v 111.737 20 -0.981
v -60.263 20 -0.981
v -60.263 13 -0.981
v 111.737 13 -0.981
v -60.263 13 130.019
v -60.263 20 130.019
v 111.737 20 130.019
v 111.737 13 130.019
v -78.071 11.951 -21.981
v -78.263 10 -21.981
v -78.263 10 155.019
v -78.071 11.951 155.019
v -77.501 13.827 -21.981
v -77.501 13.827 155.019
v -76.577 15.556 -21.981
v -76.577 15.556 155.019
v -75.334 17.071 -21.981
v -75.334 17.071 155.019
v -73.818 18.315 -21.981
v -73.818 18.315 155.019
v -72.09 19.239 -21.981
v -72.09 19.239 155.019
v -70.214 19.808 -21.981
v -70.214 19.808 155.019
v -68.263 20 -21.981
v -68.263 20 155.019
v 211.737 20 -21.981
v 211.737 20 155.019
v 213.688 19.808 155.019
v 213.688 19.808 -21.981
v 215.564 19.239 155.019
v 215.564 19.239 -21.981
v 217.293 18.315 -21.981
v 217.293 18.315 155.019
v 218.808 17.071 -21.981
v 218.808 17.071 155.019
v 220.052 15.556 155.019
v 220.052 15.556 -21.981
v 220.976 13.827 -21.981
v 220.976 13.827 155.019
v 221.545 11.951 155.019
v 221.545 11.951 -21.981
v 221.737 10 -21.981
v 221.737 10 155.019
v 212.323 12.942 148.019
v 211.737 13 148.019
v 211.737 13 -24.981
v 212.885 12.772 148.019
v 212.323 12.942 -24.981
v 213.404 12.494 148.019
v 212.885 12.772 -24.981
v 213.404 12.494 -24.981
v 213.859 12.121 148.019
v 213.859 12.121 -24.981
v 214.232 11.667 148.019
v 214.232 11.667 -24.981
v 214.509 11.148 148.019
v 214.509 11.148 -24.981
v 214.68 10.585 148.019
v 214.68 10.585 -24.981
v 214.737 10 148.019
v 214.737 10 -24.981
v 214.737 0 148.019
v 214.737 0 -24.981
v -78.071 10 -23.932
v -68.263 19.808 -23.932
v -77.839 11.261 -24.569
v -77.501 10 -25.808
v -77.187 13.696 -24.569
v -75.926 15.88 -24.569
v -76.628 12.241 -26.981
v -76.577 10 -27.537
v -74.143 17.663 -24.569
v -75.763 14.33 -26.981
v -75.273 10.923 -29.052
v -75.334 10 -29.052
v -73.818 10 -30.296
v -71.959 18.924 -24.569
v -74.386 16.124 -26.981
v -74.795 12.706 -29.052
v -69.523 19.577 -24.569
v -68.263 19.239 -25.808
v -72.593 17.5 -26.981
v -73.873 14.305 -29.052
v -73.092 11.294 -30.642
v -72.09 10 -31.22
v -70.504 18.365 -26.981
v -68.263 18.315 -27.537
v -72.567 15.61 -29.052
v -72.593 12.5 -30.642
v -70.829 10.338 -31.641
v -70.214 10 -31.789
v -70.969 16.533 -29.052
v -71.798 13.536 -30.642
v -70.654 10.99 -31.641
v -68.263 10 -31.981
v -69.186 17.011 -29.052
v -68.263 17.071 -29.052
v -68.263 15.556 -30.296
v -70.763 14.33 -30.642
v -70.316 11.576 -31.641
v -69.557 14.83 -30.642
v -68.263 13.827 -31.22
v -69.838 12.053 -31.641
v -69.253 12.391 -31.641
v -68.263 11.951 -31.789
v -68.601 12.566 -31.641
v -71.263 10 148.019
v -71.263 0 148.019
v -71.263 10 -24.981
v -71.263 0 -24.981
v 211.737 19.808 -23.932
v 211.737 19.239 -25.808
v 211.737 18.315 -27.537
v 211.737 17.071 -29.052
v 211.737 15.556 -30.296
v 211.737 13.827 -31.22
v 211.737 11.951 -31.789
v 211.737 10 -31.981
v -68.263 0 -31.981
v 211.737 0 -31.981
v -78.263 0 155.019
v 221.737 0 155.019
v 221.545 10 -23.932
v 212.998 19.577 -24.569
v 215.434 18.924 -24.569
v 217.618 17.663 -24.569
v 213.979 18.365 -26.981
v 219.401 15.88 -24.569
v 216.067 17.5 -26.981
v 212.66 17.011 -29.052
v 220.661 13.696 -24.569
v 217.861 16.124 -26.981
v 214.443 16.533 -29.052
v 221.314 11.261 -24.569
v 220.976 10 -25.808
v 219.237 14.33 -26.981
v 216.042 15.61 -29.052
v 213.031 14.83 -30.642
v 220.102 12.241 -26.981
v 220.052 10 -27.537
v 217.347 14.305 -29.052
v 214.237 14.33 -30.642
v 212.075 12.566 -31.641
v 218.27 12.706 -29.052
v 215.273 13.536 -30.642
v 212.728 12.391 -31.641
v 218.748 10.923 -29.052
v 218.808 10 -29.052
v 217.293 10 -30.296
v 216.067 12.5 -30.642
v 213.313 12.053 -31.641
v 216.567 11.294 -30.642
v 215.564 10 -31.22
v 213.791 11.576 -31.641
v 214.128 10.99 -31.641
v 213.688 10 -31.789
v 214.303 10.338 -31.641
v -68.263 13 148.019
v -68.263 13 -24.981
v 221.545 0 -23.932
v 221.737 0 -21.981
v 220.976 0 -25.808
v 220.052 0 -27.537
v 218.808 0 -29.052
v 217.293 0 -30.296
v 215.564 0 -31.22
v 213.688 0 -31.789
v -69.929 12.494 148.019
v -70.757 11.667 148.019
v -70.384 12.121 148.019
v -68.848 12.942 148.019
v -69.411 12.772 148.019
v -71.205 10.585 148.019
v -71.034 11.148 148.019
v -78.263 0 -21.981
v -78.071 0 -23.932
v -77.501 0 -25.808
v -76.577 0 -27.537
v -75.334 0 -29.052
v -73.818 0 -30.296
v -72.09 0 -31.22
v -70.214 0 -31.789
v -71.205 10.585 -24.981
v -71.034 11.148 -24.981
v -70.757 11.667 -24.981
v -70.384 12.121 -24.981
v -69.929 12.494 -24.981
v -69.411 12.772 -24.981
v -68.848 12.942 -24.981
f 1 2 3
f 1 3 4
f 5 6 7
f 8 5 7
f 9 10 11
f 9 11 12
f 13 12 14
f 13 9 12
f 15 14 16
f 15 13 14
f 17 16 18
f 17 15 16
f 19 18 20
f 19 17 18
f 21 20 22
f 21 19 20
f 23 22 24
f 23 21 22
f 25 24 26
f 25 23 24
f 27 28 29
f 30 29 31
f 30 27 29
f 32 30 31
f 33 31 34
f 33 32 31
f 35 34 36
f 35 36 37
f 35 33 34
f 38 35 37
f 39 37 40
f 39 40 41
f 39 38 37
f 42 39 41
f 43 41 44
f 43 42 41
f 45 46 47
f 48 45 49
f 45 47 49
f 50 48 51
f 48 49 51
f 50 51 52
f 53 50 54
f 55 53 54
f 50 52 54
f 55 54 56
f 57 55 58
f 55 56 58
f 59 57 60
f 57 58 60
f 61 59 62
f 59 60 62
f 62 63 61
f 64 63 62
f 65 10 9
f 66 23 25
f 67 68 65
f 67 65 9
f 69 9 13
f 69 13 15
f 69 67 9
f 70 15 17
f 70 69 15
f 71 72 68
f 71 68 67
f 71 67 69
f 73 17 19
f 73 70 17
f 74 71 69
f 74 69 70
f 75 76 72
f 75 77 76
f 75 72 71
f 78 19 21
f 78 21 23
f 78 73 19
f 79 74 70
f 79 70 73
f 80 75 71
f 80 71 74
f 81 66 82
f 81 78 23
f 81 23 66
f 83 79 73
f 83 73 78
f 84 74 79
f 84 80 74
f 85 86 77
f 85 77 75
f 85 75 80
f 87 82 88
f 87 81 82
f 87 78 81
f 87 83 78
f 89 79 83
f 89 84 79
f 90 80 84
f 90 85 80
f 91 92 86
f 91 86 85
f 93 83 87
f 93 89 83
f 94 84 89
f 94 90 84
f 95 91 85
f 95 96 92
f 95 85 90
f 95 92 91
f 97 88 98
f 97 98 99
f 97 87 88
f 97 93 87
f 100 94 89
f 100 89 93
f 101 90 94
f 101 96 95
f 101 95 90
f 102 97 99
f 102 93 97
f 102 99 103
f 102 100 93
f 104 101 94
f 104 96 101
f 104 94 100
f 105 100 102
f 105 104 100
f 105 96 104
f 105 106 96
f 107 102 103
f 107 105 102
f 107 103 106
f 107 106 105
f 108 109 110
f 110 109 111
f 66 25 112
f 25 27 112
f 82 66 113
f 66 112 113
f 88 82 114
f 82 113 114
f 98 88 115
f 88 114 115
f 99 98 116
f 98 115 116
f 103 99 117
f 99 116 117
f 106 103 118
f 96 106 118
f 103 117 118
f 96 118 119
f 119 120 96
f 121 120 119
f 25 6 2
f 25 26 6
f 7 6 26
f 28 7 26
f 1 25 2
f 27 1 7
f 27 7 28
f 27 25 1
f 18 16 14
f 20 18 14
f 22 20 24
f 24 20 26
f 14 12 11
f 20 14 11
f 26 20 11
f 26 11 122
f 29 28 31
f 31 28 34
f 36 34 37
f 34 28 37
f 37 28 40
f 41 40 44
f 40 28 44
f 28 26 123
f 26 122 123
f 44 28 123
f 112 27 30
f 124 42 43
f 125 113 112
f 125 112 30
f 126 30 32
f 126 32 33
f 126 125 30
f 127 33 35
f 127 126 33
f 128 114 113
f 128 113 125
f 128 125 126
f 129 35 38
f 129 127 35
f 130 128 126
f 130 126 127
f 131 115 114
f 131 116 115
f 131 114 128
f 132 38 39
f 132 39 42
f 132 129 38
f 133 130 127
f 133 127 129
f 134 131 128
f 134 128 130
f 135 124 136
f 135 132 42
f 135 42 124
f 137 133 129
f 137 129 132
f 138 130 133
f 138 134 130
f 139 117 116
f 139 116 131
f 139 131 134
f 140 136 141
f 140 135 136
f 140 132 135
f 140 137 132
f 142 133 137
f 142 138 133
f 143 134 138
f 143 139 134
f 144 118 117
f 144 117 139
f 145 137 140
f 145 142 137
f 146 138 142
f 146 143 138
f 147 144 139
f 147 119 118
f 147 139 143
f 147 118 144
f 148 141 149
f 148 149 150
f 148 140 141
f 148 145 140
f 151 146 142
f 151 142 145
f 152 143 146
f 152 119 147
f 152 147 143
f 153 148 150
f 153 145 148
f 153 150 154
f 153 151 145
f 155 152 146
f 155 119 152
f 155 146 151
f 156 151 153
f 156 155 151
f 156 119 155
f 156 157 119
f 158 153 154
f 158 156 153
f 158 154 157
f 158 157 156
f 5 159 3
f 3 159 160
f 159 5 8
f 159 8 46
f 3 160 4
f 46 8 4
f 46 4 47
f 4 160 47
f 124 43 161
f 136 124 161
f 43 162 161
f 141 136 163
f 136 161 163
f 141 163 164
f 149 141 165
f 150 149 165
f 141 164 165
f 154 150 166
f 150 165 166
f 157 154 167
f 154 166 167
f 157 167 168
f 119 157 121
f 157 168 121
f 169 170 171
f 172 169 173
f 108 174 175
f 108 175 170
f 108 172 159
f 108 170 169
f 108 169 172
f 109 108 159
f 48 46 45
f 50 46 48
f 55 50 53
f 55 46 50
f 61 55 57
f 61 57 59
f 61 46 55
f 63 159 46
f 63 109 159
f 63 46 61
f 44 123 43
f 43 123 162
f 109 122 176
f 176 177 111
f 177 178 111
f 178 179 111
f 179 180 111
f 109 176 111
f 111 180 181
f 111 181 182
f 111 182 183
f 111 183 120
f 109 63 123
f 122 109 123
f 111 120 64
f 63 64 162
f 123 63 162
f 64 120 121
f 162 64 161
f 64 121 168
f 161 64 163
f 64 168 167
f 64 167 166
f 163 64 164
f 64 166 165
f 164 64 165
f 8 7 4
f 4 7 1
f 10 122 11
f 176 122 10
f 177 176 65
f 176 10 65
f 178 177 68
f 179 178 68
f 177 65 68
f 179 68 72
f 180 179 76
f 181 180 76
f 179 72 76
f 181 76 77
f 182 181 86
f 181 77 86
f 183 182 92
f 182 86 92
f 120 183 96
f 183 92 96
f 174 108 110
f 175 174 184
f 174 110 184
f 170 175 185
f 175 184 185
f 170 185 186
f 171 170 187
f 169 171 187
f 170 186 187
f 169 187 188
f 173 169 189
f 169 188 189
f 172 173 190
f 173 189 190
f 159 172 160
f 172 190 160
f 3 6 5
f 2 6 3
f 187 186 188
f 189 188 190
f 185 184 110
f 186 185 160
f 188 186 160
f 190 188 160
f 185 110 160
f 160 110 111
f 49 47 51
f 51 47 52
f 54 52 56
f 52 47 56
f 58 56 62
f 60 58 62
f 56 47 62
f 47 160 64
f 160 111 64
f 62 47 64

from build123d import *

# Parameters (mm, degrees)
SKETCH1_W           = 300
SKETCH1_H           = 187
BOSS_EXTRUDE1_DEPTH = 20
FILLET1_R           = 10
FILLET2_R           = 10
SHELL2_T            = -7
SKETCH2_W           = 172
SKETCH2_H           = 131
CUT_EXTRUDE2_DEPTH  = 7
FILLET3_R           = 10


with BuildPart() as part:
    # Sketch1 → Boss-Extrude1 (new body)
    with BuildSketch(Plane(origin=(0, 0, 0), x_dir=(1, 0, 0), z_dir=(0, 1, 0))):
        with Locations((71.737321437, -61.518699121)):
            Rectangle(SKETCH1_W, SKETCH1_H)
    extrude(amount=BOSS_EXTRUDE1_DEPTH)

    # Fillet1
    fillet1_edges = [part.edges().sort_by_distance(p)[0] for p in [
        (-78.262678563, 20, 61.518699121),
    ]]
    fillet(fillet1_edges, radius=FILLET1_R)

    # Fillet2
    fillet2_edges = [part.edges().sort_by_distance(p)[0] for p in [
        (221.737321437, 20, 61.518699121),
    ]]
    fillet(fillet2_edges, radius=FILLET2_R)

    # Shell2
    shell2_openings = [part.faces().sort_by_distance(p)[0] for p in [
        (71.737321437, 0, 61.518699121),
    ]]
    offset(amount=SHELL2_T, openings=shell2_openings, kind=Kind.INTERSECTION)

    # Sketch2 → Cut-Extrude2 (cut)
    with BuildSketch(Plane(origin=(0, 20, 0), x_dir=(1, 0, 0), z_dir=(0, 1, 0))):
        with Locations((25.737321437, -64.518699121)):
            Rectangle(SKETCH2_W, SKETCH2_H)
    extrude(amount=-CUT_EXTRUDE2_DEPTH, mode=Mode.SUBTRACT)

    # Fillet3
    fillet3_edges = [part.edges().sort_by_distance(p)[0] for p in [
        (71.737321437, 20, -31.981300879),
        (-78.262678563, 5, -31.981300879),
        (-75.333746375, 17.071067812, -31.981300879),
        (221.737321437, 5, -31.981300879),
        (218.808389249, 17.071067812, -31.981300879),
    ]]
    fillet(fillet3_edges, radius=FILLET3_R)


solid = part.part
